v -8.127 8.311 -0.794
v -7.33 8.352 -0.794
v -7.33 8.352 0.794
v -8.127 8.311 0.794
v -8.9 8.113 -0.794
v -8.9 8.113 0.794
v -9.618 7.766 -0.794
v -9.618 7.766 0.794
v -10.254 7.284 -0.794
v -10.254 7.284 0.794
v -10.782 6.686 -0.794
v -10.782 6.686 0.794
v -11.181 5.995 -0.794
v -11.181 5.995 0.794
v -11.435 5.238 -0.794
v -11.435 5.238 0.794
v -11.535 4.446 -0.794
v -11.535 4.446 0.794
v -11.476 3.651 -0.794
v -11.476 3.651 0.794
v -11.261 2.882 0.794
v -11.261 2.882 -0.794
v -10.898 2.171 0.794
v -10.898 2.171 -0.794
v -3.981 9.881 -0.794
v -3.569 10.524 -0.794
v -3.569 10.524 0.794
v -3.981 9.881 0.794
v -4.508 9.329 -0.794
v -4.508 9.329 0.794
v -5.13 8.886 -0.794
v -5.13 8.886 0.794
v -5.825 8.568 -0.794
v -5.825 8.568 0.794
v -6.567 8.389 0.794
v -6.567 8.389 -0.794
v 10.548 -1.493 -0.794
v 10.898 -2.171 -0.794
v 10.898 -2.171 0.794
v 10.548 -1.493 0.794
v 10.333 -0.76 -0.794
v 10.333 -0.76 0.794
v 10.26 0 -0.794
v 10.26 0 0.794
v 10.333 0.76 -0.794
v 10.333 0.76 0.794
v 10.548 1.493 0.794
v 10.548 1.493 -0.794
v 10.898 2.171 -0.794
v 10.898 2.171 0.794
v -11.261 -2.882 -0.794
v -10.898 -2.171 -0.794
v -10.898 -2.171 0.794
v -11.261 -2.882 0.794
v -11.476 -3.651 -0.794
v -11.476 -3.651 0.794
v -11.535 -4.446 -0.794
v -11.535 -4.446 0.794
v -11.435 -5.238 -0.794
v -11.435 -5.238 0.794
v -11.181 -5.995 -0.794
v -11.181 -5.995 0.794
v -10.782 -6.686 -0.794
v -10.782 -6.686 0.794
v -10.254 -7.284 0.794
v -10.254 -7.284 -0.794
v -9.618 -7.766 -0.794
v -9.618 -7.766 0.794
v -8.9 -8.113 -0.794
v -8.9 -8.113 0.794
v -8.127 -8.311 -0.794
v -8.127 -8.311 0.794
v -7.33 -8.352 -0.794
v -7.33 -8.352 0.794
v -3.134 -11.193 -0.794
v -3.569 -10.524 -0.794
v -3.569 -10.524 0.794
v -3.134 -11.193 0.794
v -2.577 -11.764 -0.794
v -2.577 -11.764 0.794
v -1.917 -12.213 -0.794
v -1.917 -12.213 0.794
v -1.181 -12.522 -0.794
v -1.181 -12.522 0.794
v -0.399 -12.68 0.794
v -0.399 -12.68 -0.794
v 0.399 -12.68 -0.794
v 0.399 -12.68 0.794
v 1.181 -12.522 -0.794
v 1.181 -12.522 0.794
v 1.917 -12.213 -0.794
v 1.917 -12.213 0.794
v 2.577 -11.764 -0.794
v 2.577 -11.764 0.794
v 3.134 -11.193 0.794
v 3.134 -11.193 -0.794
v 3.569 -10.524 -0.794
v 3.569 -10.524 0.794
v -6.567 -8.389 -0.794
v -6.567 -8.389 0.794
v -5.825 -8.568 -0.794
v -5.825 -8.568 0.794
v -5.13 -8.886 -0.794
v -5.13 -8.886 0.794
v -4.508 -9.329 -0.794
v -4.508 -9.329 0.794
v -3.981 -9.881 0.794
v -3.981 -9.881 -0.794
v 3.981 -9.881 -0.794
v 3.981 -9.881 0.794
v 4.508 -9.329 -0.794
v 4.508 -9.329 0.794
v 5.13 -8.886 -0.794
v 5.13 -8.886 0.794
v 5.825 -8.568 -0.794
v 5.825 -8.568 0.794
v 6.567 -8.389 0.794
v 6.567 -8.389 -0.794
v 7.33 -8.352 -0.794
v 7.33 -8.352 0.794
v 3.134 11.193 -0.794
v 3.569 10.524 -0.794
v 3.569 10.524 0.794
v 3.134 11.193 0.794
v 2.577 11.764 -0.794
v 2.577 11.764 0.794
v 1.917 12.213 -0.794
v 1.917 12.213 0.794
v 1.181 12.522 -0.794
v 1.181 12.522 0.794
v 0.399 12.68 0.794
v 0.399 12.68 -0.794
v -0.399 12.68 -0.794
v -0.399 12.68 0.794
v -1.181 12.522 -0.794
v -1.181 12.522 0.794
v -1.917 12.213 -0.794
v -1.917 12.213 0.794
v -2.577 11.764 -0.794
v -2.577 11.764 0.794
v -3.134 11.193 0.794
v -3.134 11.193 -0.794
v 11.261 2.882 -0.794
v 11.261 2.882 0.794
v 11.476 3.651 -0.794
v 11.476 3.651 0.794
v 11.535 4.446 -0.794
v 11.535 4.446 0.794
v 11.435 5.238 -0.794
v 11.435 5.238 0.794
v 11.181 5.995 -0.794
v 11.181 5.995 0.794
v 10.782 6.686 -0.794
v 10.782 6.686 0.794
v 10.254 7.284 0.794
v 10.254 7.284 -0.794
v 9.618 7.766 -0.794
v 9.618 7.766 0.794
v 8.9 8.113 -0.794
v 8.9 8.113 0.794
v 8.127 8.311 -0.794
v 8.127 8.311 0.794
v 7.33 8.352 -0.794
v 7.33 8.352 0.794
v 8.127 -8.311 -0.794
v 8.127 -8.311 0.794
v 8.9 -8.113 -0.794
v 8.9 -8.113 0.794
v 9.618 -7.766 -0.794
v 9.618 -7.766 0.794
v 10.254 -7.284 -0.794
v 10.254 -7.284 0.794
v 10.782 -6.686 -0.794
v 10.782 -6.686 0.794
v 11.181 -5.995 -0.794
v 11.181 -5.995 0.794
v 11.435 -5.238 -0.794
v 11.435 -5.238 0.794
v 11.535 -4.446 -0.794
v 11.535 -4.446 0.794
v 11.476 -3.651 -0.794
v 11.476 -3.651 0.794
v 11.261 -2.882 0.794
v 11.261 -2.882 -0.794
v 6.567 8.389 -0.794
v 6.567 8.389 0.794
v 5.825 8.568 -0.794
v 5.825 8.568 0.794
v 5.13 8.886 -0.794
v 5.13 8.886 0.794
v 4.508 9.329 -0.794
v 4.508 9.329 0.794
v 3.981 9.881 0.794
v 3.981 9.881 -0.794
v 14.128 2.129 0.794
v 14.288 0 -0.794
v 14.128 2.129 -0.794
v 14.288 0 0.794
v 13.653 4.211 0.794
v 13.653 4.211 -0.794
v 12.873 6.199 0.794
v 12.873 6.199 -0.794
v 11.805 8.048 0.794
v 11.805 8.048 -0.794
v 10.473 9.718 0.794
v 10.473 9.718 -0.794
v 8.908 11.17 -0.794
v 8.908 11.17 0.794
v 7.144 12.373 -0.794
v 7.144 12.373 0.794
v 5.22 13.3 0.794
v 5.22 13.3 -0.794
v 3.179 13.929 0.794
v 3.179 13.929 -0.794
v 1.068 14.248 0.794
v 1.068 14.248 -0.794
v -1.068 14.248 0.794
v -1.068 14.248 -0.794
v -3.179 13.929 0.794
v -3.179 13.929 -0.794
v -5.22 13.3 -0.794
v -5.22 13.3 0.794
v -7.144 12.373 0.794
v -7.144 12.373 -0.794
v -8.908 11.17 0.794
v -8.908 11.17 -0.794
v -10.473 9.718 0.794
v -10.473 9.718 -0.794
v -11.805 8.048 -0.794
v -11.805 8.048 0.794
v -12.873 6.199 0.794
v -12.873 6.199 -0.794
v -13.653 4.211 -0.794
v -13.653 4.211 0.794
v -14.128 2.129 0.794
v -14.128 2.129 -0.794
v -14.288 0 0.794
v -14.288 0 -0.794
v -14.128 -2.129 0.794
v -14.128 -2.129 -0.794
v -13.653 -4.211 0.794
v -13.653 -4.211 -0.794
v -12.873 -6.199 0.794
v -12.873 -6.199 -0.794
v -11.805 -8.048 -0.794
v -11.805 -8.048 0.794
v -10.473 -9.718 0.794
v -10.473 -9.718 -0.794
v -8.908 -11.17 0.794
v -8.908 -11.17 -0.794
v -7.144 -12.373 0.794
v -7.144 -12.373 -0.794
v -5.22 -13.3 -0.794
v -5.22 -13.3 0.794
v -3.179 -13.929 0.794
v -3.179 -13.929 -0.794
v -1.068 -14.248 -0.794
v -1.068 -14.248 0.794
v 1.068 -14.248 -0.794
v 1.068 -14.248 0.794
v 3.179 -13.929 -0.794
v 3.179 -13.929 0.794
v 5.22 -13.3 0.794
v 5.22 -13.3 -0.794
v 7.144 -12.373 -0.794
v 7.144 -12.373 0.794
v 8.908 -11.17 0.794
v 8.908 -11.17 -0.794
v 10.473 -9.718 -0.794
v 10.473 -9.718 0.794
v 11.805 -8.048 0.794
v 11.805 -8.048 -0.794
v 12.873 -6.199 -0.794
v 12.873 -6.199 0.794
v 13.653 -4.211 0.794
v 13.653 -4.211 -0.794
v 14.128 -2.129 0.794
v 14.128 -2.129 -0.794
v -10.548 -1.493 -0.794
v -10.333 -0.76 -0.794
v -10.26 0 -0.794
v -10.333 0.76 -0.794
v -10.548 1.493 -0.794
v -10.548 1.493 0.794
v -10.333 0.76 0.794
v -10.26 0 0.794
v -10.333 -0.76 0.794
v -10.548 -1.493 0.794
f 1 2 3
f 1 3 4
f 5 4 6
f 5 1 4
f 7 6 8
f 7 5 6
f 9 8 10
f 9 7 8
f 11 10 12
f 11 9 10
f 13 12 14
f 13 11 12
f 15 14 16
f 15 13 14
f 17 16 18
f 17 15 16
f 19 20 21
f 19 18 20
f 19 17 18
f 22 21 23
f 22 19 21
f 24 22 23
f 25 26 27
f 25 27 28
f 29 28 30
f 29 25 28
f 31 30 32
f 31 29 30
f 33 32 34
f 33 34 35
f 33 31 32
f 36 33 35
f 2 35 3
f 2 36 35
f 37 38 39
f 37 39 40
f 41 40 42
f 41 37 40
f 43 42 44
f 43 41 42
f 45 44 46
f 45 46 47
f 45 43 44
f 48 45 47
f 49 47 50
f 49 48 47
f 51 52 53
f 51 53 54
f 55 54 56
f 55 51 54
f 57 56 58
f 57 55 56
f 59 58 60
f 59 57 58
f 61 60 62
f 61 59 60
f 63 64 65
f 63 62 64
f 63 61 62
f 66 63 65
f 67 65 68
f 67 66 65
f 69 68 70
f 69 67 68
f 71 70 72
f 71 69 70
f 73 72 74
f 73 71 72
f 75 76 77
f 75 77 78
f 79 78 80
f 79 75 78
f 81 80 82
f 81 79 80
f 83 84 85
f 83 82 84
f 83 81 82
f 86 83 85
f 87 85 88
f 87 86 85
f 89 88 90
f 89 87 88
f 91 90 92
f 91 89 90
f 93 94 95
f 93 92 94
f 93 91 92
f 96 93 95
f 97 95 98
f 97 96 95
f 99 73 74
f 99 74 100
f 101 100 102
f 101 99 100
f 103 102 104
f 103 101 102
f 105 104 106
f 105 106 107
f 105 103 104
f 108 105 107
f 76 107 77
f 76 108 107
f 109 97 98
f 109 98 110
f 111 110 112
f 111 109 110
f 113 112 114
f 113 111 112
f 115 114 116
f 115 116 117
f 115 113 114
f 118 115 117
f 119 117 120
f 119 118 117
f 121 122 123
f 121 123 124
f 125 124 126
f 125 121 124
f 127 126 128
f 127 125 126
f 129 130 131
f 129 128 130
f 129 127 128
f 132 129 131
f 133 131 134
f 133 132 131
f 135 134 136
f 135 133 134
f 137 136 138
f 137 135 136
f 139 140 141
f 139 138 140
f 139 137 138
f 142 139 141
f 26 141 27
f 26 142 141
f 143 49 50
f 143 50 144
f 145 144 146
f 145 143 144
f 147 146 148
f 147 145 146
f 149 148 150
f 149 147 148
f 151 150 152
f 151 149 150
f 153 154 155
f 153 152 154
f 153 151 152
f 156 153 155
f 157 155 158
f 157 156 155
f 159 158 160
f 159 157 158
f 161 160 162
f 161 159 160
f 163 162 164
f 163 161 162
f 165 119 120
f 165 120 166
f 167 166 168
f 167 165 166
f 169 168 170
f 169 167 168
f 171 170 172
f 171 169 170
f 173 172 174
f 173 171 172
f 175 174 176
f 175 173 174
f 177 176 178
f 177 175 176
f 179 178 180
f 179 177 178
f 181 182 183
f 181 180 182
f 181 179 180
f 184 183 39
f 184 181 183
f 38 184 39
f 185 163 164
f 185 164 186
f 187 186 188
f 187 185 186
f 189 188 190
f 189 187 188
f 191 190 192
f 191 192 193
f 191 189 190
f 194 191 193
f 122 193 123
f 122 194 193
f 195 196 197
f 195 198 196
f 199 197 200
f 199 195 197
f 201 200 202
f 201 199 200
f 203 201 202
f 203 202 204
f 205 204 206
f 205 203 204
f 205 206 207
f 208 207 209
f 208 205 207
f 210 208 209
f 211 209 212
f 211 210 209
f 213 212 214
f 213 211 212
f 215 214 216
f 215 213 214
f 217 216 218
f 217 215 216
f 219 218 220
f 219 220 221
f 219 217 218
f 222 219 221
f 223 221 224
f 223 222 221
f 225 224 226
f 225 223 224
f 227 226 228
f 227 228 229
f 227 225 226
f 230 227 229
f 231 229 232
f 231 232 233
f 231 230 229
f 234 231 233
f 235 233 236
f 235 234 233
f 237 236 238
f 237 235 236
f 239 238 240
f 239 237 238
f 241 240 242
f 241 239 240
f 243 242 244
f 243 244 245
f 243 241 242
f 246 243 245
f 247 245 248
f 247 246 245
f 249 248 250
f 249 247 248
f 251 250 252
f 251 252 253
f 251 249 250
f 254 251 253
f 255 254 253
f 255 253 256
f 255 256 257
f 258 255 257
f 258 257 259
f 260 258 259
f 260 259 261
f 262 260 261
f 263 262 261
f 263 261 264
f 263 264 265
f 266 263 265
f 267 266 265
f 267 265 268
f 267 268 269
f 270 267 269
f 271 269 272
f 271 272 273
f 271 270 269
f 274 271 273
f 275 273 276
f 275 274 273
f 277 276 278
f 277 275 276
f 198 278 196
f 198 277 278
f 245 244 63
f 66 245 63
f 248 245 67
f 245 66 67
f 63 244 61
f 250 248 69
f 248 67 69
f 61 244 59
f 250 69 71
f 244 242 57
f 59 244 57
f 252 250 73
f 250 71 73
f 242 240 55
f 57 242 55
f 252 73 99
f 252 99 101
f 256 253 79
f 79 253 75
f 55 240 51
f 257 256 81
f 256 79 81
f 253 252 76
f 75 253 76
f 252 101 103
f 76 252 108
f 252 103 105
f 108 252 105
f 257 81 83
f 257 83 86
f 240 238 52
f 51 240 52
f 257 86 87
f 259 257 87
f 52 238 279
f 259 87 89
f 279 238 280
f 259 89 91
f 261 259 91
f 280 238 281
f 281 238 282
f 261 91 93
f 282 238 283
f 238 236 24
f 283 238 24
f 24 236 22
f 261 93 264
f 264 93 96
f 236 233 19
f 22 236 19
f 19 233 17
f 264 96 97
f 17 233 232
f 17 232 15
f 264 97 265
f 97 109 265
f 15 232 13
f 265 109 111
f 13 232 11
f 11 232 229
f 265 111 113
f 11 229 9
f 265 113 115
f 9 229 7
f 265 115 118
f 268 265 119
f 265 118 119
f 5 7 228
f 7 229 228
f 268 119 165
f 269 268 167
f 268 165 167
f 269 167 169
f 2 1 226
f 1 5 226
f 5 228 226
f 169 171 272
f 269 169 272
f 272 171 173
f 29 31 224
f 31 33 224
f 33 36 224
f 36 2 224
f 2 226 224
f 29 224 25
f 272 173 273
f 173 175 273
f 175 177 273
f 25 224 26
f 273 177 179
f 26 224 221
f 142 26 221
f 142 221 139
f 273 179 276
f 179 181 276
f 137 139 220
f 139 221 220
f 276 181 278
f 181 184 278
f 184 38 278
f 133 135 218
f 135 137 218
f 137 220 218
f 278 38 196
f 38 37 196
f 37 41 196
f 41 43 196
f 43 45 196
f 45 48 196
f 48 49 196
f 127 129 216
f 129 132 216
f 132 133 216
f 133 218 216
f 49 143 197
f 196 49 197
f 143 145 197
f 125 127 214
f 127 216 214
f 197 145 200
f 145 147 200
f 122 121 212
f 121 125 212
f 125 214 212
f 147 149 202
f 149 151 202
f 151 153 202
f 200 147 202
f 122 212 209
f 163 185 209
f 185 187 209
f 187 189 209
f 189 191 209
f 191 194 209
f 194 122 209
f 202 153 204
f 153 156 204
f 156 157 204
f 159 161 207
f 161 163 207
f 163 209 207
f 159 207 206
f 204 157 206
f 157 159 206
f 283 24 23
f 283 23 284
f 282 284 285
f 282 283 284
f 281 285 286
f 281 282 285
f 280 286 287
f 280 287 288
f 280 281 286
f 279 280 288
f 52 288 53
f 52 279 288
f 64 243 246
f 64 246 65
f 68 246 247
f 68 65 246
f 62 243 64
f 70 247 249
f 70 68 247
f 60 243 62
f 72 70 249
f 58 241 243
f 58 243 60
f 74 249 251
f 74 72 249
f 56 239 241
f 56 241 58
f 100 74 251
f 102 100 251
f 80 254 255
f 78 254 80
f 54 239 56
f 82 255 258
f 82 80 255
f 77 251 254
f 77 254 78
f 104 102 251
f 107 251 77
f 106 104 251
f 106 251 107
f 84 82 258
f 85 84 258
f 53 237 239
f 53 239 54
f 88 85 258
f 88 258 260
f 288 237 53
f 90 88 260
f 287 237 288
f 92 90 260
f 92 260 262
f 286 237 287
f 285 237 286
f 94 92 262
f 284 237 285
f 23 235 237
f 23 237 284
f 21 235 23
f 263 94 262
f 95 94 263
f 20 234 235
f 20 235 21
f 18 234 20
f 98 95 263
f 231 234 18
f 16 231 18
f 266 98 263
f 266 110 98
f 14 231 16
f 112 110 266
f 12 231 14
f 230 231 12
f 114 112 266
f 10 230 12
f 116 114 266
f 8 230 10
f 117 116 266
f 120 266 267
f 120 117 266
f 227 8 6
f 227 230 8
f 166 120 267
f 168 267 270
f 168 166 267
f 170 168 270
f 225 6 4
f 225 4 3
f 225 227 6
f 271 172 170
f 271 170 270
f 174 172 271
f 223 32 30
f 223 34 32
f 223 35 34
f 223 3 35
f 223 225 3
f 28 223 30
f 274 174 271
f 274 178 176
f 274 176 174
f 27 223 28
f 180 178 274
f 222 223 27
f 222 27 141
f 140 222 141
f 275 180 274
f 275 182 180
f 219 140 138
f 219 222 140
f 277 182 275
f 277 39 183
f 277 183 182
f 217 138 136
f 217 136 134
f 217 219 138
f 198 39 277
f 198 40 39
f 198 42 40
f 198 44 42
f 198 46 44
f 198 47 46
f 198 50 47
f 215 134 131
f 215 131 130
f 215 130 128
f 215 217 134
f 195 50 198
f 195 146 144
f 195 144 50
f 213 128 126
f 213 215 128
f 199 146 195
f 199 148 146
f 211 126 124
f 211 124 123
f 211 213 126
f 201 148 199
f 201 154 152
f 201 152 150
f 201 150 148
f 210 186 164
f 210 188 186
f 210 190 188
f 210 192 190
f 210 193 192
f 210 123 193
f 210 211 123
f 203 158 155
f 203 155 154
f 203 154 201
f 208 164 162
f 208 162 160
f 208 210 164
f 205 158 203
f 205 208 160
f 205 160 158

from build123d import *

# Parameters (mm, degrees)
SKETCH1_R           = 14.2875
BOSS_EXTRUDE1_DEPTH = 0.79375
CUT_EXTRUDE1_DEPTH  = 2.5875


with BuildPart() as part:
    # Sketch1 → Boss-Extrude1 (new body, symmetric)
    with BuildSketch(Plane.XY):
        Circle(SKETCH1_R)
    extrude(amount=BOSS_EXTRUDE1_DEPTH, both=True)

    # Sketch2 → Cut-Extrude1 (cut, through all)
    with BuildSketch(Plane(origin=(0, 0, -0.79375), x_dir=(-1, 0, 0), z_dir=(0, 0, -1))):
        with BuildLine():
            ThreePointArc((-7.329682086, 8.352449747), (-5.130117272, 8.885623765), (-3.568592622, 10.523915761))
            ThreePointArc((-3.568592622, 10.523915761), (0, 12.7), (3.568592622, 10.523915761))
            ThreePointArc((3.568592622, 10.523915761), (5.130117272, 8.885623765), (7.329682086, 8.352449747))
            ThreePointArc((7.329682086, 8.352449747), (10.998522628, 6.35), (10.898274707, 2.171466014))
            ThreePointArc((10.898274707, 2.171466014), (10.260234545, 0), (10.898274707, -2.171466014))
            ThreePointArc((10.898274707, -2.171466014), (10.998522628, -6.35), (7.329682086, -8.352449747))
            ThreePointArc((7.329682086, -8.352449747), (5.130117272, -8.885623765), (3.568592622, -10.523915761))
            ThreePointArc((3.568592622, -10.523915761), (0, -12.7), (-3.568592622, -10.523915761))
            ThreePointArc((-3.568592622, -10.523915761), (-5.130117272, -8.885623765), (-7.329682086, -8.352449747))
            ThreePointArc((-7.329682086, -8.352449747), (-10.998522628, -6.35), (-10.898274707, -2.171466014))
            ThreePointArc((-10.898274707, -2.171466014), (-10.260234545, 0), (-10.898274707, 2.171466014))
            ThreePointArc((-10.898274707, 2.171466014), (-10.998522628, 6.35), (-7.329682086, 8.352449747))
        make_face()
    extrude(amount=-CUT_EXTRUDE1_DEPTH, mode=Mode.SUBTRACT)


solid = part.part
